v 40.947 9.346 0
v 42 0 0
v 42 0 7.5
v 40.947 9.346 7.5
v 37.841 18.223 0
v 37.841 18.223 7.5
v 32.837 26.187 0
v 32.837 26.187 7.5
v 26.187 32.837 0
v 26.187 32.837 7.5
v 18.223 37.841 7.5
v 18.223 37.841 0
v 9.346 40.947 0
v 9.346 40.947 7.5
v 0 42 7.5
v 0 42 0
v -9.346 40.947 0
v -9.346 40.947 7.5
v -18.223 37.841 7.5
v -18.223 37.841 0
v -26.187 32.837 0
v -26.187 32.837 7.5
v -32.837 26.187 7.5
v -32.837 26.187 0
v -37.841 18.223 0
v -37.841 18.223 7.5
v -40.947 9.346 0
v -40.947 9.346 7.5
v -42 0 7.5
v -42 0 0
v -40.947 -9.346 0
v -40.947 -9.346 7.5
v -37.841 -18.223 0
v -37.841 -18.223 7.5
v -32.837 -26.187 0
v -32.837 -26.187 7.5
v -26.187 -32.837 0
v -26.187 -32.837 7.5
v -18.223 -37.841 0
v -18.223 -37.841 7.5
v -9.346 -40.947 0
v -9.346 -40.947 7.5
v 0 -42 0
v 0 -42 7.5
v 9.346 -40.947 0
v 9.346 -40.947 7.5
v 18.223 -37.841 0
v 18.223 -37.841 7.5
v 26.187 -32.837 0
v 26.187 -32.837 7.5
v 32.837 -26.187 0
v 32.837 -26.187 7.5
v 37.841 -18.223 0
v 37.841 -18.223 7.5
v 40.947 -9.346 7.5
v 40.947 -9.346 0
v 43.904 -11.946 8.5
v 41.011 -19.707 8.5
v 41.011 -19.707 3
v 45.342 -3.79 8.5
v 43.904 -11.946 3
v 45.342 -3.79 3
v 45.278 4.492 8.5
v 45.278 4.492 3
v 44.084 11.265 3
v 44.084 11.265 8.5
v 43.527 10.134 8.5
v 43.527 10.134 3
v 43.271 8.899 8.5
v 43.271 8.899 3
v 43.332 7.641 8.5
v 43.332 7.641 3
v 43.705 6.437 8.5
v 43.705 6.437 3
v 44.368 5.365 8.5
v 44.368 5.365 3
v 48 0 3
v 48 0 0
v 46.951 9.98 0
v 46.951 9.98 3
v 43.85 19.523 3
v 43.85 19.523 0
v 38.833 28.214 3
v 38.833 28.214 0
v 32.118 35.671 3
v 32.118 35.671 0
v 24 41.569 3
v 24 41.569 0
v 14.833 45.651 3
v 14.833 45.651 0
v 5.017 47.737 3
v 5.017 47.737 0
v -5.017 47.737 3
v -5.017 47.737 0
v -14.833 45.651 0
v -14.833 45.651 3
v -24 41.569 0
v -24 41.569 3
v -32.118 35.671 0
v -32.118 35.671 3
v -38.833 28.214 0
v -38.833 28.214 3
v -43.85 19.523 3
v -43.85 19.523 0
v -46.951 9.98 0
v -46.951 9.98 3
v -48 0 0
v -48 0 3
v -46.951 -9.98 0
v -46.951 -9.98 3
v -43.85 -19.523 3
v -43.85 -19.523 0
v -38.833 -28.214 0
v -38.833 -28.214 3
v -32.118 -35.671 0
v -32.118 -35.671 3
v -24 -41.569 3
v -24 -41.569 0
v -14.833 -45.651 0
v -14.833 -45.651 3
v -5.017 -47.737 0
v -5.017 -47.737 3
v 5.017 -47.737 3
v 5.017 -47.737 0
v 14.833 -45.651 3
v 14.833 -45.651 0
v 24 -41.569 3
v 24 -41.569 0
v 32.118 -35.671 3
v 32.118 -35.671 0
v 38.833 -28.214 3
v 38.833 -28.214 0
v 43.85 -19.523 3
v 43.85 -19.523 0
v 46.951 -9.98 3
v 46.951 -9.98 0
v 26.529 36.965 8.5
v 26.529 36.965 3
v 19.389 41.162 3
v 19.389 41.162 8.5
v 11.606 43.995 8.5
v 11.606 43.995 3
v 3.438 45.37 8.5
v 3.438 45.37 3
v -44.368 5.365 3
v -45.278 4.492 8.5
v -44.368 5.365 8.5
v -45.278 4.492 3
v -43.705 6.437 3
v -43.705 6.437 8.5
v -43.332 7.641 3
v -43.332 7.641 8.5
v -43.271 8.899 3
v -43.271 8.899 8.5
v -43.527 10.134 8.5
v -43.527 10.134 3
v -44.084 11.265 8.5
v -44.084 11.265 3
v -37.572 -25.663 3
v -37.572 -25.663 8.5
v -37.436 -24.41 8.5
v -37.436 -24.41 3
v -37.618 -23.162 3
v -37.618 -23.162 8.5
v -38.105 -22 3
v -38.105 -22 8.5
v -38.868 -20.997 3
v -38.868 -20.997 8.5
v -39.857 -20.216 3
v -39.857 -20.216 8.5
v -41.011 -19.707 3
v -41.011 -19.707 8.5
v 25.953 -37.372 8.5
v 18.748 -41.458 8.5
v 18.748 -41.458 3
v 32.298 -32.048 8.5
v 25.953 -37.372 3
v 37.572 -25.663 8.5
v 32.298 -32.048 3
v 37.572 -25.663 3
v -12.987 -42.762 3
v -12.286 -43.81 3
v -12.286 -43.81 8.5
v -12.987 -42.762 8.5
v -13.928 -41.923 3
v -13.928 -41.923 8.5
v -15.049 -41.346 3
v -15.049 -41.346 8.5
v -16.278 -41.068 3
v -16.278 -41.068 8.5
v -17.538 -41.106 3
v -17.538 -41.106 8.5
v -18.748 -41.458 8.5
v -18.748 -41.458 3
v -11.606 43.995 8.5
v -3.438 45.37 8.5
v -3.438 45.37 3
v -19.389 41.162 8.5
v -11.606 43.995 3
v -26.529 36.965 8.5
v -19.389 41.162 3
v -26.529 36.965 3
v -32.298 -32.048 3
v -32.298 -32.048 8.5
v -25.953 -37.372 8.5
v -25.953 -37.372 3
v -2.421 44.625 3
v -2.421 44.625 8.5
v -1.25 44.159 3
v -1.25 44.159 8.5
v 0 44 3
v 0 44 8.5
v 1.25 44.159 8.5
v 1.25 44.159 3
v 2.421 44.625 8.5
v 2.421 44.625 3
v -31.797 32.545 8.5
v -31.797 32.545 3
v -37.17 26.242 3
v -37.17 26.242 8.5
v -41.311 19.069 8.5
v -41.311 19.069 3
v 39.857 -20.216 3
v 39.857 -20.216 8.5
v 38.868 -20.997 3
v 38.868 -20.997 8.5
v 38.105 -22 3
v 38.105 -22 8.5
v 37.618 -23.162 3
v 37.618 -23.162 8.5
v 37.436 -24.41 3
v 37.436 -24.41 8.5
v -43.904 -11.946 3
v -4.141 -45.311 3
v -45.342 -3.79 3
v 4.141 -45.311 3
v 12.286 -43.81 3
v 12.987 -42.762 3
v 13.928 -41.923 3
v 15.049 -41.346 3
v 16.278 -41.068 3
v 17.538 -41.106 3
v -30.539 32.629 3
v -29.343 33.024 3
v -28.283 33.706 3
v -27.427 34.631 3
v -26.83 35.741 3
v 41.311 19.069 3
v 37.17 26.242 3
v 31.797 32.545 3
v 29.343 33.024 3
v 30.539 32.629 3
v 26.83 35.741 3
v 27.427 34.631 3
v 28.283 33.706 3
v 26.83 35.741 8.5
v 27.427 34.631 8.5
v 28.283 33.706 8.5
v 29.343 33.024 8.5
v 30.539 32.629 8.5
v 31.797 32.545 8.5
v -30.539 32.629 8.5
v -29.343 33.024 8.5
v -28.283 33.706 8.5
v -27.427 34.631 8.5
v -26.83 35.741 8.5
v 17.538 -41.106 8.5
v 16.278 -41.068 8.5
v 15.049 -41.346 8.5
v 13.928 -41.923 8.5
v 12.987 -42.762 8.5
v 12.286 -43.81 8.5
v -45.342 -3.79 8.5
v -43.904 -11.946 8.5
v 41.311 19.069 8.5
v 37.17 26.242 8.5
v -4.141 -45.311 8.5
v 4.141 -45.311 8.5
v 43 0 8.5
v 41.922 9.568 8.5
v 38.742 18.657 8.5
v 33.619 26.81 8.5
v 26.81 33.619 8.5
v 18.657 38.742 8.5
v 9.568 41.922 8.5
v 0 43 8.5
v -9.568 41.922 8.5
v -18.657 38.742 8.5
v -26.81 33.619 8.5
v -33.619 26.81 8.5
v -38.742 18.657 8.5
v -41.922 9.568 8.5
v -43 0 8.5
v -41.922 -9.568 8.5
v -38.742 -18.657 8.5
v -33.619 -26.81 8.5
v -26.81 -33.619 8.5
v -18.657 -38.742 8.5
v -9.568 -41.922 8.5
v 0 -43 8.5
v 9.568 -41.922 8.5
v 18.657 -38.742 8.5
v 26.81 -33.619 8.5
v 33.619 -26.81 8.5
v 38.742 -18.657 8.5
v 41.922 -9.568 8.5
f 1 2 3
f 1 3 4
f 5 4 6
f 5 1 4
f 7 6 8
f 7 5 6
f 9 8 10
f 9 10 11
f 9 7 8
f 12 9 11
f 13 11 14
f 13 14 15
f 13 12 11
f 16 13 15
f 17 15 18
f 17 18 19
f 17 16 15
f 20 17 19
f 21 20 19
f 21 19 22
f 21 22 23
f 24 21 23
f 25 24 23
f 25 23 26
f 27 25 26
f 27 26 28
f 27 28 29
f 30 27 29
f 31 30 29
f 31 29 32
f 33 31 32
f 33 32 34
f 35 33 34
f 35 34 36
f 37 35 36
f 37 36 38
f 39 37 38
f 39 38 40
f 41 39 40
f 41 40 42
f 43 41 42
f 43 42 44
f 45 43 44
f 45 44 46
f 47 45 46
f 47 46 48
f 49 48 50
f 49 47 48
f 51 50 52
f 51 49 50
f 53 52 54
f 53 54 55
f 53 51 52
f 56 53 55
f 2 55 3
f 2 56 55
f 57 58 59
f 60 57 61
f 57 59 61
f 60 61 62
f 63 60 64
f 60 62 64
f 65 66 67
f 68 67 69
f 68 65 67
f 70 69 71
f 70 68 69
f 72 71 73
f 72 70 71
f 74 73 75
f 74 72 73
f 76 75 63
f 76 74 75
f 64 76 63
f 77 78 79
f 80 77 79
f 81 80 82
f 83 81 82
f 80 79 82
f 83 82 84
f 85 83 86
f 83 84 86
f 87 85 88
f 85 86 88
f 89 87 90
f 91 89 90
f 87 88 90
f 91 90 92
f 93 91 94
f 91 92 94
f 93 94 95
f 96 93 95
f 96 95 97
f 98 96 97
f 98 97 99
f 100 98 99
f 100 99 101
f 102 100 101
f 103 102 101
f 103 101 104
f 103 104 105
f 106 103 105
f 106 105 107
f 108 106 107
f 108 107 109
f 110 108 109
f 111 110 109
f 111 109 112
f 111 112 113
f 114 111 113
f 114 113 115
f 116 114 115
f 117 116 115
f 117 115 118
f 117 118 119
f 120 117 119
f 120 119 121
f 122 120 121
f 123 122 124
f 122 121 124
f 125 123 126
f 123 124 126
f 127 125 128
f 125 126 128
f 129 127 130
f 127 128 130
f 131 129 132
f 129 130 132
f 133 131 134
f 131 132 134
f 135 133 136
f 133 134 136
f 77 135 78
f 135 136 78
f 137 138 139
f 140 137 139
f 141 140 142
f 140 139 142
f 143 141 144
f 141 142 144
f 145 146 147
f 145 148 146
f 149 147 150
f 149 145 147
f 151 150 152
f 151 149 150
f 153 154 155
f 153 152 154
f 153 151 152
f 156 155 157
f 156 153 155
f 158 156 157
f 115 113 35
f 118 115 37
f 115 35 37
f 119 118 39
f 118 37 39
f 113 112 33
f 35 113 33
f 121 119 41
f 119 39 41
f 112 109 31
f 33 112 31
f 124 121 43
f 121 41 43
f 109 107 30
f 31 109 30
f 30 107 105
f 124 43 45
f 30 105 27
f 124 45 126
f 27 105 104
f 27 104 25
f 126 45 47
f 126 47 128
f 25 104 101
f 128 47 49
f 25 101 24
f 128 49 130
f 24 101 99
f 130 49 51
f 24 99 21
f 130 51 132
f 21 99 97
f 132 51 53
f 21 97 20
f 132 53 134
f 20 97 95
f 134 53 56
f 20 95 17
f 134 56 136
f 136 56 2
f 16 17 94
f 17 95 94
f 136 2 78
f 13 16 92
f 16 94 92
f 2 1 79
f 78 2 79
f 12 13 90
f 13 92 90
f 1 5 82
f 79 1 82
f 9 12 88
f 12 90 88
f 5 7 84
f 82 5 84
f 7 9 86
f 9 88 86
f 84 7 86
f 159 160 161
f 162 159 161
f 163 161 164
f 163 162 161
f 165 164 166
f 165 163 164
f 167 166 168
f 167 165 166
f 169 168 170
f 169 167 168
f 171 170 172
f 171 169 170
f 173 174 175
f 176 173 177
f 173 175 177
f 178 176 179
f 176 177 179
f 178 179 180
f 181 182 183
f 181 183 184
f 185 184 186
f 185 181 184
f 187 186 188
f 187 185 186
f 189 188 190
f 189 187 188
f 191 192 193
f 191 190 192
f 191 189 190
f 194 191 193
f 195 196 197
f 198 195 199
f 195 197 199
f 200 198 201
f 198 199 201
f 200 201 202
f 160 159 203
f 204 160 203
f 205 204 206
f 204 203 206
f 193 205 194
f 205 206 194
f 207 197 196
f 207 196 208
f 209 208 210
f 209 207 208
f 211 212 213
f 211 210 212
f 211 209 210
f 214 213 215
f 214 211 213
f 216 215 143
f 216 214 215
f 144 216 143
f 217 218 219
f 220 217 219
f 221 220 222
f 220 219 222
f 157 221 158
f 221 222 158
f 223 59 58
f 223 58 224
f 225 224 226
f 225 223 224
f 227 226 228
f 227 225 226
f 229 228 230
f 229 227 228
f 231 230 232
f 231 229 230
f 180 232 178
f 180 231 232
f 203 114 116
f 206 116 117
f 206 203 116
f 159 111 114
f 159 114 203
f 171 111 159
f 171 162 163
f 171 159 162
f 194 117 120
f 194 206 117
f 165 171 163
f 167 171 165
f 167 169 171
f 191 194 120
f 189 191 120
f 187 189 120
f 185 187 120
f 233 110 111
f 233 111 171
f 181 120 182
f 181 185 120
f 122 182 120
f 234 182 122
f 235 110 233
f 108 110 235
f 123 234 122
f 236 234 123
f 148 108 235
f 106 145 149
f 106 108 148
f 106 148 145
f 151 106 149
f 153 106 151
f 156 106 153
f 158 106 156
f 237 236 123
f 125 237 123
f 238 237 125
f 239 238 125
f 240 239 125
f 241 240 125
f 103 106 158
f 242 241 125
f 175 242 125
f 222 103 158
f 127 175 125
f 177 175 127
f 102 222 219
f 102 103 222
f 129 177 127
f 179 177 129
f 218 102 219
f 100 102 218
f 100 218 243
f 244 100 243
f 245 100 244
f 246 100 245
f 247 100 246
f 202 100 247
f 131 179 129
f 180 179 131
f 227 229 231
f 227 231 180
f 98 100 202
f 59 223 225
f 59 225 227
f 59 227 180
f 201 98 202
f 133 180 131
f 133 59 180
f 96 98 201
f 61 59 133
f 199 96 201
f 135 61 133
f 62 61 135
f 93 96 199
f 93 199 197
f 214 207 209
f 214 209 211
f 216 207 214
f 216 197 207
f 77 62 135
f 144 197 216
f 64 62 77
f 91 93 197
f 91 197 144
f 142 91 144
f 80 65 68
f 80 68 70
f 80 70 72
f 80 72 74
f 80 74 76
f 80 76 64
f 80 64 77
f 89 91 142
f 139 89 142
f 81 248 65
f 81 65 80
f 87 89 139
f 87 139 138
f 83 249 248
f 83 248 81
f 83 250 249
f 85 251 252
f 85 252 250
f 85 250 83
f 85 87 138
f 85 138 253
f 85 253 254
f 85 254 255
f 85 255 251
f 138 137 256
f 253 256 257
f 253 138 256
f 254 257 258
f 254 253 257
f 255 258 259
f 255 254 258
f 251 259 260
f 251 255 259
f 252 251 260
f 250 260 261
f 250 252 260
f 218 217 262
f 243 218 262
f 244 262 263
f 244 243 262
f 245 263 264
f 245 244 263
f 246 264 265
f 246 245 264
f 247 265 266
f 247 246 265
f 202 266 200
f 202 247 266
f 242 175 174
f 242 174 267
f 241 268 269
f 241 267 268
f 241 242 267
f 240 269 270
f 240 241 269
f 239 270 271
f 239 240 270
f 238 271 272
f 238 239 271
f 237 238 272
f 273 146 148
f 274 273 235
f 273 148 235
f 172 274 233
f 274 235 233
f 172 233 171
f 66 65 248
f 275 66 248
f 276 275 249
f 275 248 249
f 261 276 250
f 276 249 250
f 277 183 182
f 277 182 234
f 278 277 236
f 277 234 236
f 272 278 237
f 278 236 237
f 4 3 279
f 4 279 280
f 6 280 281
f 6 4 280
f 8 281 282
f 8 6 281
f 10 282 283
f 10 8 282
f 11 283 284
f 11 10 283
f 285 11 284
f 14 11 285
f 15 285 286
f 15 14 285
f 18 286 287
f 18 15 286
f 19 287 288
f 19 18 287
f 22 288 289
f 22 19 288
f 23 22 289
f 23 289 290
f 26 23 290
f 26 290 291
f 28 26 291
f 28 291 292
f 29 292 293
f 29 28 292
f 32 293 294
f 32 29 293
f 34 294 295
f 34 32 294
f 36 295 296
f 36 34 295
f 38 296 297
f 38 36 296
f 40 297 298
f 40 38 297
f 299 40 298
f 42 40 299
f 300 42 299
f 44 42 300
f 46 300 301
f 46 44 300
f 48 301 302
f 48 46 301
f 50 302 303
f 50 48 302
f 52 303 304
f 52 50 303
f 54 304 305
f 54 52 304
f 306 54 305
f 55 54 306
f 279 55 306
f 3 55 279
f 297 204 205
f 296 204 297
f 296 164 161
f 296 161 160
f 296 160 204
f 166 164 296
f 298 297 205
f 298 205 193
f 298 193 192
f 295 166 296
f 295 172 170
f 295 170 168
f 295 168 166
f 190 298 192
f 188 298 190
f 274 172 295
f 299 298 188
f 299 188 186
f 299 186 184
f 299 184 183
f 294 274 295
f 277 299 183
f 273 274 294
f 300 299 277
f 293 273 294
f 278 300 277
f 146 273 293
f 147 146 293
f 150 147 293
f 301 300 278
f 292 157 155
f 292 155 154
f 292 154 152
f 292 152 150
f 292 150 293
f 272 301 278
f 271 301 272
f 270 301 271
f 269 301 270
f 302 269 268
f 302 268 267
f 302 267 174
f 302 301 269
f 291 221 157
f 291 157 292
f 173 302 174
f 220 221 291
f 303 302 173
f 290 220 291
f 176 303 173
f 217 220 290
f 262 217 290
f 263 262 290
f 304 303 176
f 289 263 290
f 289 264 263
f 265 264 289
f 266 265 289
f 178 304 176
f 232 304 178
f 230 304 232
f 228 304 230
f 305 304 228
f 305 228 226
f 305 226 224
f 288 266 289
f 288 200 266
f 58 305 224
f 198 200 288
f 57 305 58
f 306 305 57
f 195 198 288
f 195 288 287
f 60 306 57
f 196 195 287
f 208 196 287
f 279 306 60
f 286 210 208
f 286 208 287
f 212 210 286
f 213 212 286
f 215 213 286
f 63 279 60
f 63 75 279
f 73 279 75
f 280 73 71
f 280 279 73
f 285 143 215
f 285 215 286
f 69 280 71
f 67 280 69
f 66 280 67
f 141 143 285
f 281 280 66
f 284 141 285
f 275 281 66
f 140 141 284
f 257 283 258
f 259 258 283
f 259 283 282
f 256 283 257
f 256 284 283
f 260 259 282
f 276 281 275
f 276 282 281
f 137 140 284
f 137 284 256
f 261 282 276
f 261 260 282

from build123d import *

# Parameters (mm, degrees)
SKETCH_R      = 48
SKETCH_R_2    = 42
PAD_DEPTH     = 3
SKETCH001_R   = 45.5
SKETCH001_R_2 = 42
PAD001_DEPTH  = 5.5
CHAMFER_SIZE  = 1
SKETCH002_R   = 5
POCKET_DEPTH  = 5.501


with BuildPart() as part:
    # Sketch → Pad (new body)
    with BuildSketch(Plane.XY):
        Circle(SKETCH_R)
        Circle(SKETCH_R_2, mode=Mode.SUBTRACT)
    extrude(amount=PAD_DEPTH)

    # Sketch001 (on Face4 of Pad) → Pad001 (join)
    with BuildSketch(Plane.XY.offset(3)):
        Circle(SKETCH001_R)
        Circle(SKETCH001_R_2, mode=Mode.SUBTRACT)
    extrude(amount=PAD001_DEPTH)

    # Chamfer
    chamfer_edges = [part.edges().sort_by_distance(p)[0] for p in [
        (-42, 0, 8.5),
    ]]
    chamfer(chamfer_edges, length=CHAMFER_SIZE)

    # Sketch002 → Pocket (cut, through all)
    with BuildSketch(Plane.XY.offset(3)):
        with Locations((31.496593, 37.536178)):
            Circle(SKETCH002_R)
        with Locations((48.25558, 8.508761)):
            Circle(SKETCH002_R)
        with Locations((42.435245, -24.5)):
            Circle(SKETCH002_R)
        with Locations((16.758987, -46.044938)):
            Circle(SKETCH002_R)
        with Locations((-16.758987, -46.044938)):
            Circle(SKETCH002_R)
        with Locations((-42.435245, -24.5)):
            Circle(SKETCH002_R)
        with Locations((-48.25558, 8.508761)):
            Circle(SKETCH002_R)
        with Locations((-31.496593, 37.536178)):
            Circle(SKETCH002_R)
        with Locations((0, 49)):
            Circle(SKETCH002_R)
    extrude(amount=POCKET_DEPTH, mode=Mode.SUBTRACT)


solid = part.part
